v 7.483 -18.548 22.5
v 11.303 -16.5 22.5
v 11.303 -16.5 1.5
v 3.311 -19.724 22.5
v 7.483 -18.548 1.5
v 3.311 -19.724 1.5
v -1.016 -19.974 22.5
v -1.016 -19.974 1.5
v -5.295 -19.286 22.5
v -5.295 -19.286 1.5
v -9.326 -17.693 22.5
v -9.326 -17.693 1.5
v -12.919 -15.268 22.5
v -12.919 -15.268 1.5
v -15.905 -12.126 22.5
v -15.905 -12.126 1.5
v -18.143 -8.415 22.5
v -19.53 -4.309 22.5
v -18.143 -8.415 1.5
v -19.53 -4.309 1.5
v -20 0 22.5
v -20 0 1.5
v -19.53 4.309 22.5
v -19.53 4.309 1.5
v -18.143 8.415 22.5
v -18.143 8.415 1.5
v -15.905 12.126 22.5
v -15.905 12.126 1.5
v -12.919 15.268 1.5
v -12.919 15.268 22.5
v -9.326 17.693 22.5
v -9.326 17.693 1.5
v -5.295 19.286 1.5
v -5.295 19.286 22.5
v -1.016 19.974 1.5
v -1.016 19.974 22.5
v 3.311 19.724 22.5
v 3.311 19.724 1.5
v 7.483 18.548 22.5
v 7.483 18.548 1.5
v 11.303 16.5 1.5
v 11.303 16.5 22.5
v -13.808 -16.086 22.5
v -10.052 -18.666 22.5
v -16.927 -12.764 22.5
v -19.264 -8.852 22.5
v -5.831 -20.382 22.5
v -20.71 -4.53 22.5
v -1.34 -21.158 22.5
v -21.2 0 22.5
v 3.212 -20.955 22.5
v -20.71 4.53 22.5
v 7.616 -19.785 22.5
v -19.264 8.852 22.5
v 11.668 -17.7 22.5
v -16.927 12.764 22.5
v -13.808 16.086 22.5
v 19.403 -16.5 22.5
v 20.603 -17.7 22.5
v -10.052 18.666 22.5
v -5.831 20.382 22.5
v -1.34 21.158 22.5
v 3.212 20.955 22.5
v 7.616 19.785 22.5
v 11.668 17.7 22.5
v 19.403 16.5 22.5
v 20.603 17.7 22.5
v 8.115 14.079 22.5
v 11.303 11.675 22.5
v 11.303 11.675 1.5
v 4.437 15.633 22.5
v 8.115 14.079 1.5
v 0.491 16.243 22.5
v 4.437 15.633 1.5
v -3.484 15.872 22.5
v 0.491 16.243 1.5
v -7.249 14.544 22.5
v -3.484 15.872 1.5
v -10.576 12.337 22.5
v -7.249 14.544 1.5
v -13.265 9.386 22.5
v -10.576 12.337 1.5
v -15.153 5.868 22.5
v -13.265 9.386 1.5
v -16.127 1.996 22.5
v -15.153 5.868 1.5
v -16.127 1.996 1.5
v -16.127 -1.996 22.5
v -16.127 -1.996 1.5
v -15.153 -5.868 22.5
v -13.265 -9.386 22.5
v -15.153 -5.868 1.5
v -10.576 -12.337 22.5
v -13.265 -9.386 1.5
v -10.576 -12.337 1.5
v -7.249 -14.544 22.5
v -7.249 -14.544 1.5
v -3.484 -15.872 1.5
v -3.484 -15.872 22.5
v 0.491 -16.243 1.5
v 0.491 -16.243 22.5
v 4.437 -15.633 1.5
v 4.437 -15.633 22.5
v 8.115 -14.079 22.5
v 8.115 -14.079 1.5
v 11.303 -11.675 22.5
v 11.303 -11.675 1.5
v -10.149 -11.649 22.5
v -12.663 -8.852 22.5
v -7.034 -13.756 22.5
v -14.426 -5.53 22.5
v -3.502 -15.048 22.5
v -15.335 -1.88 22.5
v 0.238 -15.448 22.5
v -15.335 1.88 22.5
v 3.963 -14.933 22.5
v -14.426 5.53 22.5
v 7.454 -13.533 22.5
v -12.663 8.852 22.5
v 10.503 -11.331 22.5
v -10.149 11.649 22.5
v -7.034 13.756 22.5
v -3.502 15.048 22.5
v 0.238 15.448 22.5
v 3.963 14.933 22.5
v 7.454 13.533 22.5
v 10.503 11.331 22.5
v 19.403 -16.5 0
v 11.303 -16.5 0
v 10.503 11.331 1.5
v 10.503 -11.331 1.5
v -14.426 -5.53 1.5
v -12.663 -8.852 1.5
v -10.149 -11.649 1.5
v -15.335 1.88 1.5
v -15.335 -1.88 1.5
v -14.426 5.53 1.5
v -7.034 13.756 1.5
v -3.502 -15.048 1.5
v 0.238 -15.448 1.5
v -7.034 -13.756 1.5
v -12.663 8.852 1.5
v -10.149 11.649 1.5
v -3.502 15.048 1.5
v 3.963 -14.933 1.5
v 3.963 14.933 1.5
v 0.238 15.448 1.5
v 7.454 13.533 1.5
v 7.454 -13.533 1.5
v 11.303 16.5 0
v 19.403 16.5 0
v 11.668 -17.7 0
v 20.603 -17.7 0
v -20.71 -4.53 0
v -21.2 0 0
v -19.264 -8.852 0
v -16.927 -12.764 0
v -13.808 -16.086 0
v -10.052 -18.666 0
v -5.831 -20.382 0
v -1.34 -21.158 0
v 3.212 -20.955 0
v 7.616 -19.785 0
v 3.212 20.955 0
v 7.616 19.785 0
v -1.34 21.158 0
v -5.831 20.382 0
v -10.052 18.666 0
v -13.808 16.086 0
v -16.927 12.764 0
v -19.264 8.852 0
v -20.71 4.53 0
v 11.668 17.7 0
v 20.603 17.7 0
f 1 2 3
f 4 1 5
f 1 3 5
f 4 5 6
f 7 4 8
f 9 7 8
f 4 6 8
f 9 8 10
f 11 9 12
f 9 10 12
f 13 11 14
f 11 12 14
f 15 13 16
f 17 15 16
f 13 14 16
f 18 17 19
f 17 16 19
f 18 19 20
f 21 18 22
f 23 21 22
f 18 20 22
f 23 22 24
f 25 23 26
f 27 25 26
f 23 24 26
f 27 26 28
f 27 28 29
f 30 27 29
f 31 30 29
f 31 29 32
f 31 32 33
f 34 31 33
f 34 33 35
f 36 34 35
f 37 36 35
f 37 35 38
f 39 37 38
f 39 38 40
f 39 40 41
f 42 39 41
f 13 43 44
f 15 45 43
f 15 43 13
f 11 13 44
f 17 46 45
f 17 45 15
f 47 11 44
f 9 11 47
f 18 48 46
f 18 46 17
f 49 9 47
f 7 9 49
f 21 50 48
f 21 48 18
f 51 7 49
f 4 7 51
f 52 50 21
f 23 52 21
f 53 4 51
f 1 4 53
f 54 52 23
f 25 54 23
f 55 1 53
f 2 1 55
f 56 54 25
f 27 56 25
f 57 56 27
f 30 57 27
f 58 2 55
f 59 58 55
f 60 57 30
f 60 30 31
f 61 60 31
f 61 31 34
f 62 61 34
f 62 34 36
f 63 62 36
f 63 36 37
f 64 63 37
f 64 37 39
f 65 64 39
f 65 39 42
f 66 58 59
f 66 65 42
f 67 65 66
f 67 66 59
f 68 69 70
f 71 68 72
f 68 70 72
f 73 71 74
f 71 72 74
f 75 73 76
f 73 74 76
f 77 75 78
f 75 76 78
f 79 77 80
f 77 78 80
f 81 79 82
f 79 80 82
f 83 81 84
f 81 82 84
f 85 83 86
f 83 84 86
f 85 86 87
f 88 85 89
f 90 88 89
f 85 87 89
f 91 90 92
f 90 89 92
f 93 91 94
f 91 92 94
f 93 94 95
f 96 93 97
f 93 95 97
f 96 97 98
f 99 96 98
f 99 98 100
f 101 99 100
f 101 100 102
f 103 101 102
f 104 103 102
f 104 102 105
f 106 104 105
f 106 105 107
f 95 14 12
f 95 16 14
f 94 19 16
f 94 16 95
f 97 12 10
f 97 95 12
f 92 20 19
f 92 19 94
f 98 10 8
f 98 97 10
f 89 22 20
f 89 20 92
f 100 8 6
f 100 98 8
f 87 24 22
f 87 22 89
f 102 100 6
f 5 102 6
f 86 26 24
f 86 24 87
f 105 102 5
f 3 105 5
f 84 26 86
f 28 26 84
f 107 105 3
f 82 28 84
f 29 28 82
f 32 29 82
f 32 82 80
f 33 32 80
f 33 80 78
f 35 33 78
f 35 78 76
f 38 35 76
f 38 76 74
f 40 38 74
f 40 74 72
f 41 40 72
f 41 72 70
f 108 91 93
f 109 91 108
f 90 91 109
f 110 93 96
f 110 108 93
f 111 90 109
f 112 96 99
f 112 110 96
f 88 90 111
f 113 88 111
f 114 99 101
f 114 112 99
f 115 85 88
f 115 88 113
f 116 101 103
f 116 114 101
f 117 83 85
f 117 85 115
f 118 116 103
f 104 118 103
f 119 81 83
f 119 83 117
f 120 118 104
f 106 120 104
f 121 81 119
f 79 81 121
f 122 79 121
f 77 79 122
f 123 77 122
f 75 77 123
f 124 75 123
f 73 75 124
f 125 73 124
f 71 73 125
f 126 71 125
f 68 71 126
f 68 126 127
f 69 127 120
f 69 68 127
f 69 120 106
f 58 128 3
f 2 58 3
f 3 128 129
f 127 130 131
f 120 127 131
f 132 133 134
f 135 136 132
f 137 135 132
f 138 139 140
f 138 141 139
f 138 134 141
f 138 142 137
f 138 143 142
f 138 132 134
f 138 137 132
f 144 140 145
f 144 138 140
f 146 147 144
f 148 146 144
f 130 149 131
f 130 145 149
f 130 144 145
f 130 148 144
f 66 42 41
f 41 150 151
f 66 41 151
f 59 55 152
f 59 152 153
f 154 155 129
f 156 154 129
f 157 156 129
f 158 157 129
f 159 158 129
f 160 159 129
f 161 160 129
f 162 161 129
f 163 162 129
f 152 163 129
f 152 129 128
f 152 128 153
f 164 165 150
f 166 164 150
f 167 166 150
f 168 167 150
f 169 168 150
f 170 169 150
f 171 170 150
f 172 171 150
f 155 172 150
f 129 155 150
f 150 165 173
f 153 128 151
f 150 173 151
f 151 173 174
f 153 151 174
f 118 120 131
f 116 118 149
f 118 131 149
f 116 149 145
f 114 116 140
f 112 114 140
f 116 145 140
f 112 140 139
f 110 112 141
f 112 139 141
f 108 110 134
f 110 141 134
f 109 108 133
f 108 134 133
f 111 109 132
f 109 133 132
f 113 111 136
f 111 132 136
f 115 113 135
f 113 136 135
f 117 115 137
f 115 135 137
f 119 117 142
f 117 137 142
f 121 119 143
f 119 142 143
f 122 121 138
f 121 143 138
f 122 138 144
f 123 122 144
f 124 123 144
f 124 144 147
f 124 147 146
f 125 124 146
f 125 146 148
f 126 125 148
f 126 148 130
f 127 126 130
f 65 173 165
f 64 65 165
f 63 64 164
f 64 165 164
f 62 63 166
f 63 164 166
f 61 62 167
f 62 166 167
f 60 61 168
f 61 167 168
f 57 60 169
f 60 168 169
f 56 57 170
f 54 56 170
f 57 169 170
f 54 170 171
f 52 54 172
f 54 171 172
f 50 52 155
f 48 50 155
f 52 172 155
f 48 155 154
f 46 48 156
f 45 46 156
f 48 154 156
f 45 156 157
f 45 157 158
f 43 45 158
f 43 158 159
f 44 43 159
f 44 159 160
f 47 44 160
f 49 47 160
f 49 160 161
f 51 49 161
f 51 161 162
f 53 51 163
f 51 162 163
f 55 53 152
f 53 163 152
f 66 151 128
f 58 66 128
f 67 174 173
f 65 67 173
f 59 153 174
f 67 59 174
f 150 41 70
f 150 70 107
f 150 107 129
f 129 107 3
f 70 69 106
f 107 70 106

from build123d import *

# Parameters (mm, degrees)
F1_DEPTH = 1.5
F2_DEPTH = 22.5
F4_DEPTH = 25


# Not quite as in the source:
# - a feature names something its author has since deleted; it is built from what else it names


with BuildPart() as f1:
    # F0 (on Top) → F1 (new body)
    with BuildSketch(Plane.XY):
        with BuildLine():
            Line((20.6026545555, 17.7), (11.6683332143, 17.7))
            ThreePointArc((11.6683332143, 17.7), (-21.2, 0), (11.6683332143, -17.7))
            Line((11.6683332143, -17.7), (20.6026545555, -17.7))
            Line((20.6026545555, -17.7), (20.6026545555, 17.7))
        make_face()
        with BuildLine():
            ThreePointArc((11.3026545555, -16.5), (-20, 0), (11.3026545555, 16.5))
            Line((11.3026545555, 16.5), (19.4026545555, 16.5))
            Line((19.4026545555, 16.5), (19.4026545555, -16.5))
            Line((19.4026545555, -16.5), (11.3026545555, -16.5))
        make_face(mode=Mode.SUBTRACT)
        with BuildLine():
            Line((19.4026545555, 16.5), (11.3026545555, 16.5))
            ThreePointArc((11.3026545555, 16.5), (-20, 0), (11.3026545555, -16.5))
            Line((11.3026545555, -16.5), (19.4026545555, -16.5))
            Line((19.4026545555, -16.5), (19.4026545555, 16.5))
        make_face()
        with BuildLine():
            ThreePointArc((11.3026545555, -11.6752944288), (-16.25, 0), (11.3026545555, 11.6752944288))
            Line((11.3026545555, 11.6752944288), (11.3026545555, -11.6752944288))
        make_face(mode=Mode.SUBTRACT)
        with BuildLine():
            Line((11.3026545555, -11.6752944288), (11.3026545555, 11.6752944288))
            ThreePointArc((11.3026545555, 11.6752944288), (-16.25, 0), (11.3026545555, -11.6752944288))
        make_face()
        with BuildLine():
            ThreePointArc((10.5026545555, -11.3312288517), (-15.45, 0), (10.5026545555, 11.3312288517))
            Line((10.5026545555, 11.3312288517), (10.5026545555, -11.3312288517))
        make_face(mode=Mode.SUBTRACT)
        with BuildLine():
            Line((10.5026545555, -11.3312288517), (10.5026545555, 11.3312288517))
            ThreePointArc((10.5026545555, 11.3312288517), (-15.45, 0), (10.5026545555, -11.3312288517))
        make_face()
    extrude(amount=F1_DEPTH)

    # F0 (on Top) → F2 (join)
    with BuildSketch(Plane.XY):
        with BuildLine():
            Line((20.6026545555, 17.7), (11.6683332143, 17.7))
            ThreePointArc((11.6683332143, 17.7), (-21.2, 0), (11.6683332143, -17.7))
            Line((11.6683332143, -17.7), (20.6026545555, -17.7))
            Line((20.6026545555, -17.7), (20.6026545555, 17.7))
        make_face()
        with BuildLine():
            ThreePointArc((11.3026545555, -16.5), (-20, 0), (11.3026545555, 16.5))
            Line((11.3026545555, 16.5), (19.4026545555, 16.5))
            Line((19.4026545555, 16.5), (19.4026545555, -16.5))
            Line((19.4026545555, -16.5), (11.3026545555, -16.5))
        make_face(mode=Mode.SUBTRACT)
        with BuildLine():
            Line((11.3026545555, -11.6752944288), (11.3026545555, 11.6752944288))
            ThreePointArc((11.3026545555, 11.6752944288), (-16.25, 0), (11.3026545555, -11.6752944288))
        make_face()
        with BuildLine():
            ThreePointArc((10.5026545555, -11.3312288517), (-15.45, 0), (10.5026545555, 11.3312288517))
            Line((10.5026545555, 11.3312288517), (10.5026545555, -11.3312288517))
        make_face(mode=Mode.SUBTRACT)
    extrude(amount=F2_DEPTH)

    # F3 (on face) → F4 (cut)
    with BuildSketch(Plane.XY.offset(1.5)):
        Polygon((19.4026545555, 16.5), (11.3026545555, 16.5), (11.3026545555, 11.6752944288), (11.3026545555, -11.6752944288), (11.3026545555, -16.5), (19.4026545555, -16.5), align=None)
    extrude(amount=-F4_DEPTH, mode=Mode.SUBTRACT)


solid = f1.part
